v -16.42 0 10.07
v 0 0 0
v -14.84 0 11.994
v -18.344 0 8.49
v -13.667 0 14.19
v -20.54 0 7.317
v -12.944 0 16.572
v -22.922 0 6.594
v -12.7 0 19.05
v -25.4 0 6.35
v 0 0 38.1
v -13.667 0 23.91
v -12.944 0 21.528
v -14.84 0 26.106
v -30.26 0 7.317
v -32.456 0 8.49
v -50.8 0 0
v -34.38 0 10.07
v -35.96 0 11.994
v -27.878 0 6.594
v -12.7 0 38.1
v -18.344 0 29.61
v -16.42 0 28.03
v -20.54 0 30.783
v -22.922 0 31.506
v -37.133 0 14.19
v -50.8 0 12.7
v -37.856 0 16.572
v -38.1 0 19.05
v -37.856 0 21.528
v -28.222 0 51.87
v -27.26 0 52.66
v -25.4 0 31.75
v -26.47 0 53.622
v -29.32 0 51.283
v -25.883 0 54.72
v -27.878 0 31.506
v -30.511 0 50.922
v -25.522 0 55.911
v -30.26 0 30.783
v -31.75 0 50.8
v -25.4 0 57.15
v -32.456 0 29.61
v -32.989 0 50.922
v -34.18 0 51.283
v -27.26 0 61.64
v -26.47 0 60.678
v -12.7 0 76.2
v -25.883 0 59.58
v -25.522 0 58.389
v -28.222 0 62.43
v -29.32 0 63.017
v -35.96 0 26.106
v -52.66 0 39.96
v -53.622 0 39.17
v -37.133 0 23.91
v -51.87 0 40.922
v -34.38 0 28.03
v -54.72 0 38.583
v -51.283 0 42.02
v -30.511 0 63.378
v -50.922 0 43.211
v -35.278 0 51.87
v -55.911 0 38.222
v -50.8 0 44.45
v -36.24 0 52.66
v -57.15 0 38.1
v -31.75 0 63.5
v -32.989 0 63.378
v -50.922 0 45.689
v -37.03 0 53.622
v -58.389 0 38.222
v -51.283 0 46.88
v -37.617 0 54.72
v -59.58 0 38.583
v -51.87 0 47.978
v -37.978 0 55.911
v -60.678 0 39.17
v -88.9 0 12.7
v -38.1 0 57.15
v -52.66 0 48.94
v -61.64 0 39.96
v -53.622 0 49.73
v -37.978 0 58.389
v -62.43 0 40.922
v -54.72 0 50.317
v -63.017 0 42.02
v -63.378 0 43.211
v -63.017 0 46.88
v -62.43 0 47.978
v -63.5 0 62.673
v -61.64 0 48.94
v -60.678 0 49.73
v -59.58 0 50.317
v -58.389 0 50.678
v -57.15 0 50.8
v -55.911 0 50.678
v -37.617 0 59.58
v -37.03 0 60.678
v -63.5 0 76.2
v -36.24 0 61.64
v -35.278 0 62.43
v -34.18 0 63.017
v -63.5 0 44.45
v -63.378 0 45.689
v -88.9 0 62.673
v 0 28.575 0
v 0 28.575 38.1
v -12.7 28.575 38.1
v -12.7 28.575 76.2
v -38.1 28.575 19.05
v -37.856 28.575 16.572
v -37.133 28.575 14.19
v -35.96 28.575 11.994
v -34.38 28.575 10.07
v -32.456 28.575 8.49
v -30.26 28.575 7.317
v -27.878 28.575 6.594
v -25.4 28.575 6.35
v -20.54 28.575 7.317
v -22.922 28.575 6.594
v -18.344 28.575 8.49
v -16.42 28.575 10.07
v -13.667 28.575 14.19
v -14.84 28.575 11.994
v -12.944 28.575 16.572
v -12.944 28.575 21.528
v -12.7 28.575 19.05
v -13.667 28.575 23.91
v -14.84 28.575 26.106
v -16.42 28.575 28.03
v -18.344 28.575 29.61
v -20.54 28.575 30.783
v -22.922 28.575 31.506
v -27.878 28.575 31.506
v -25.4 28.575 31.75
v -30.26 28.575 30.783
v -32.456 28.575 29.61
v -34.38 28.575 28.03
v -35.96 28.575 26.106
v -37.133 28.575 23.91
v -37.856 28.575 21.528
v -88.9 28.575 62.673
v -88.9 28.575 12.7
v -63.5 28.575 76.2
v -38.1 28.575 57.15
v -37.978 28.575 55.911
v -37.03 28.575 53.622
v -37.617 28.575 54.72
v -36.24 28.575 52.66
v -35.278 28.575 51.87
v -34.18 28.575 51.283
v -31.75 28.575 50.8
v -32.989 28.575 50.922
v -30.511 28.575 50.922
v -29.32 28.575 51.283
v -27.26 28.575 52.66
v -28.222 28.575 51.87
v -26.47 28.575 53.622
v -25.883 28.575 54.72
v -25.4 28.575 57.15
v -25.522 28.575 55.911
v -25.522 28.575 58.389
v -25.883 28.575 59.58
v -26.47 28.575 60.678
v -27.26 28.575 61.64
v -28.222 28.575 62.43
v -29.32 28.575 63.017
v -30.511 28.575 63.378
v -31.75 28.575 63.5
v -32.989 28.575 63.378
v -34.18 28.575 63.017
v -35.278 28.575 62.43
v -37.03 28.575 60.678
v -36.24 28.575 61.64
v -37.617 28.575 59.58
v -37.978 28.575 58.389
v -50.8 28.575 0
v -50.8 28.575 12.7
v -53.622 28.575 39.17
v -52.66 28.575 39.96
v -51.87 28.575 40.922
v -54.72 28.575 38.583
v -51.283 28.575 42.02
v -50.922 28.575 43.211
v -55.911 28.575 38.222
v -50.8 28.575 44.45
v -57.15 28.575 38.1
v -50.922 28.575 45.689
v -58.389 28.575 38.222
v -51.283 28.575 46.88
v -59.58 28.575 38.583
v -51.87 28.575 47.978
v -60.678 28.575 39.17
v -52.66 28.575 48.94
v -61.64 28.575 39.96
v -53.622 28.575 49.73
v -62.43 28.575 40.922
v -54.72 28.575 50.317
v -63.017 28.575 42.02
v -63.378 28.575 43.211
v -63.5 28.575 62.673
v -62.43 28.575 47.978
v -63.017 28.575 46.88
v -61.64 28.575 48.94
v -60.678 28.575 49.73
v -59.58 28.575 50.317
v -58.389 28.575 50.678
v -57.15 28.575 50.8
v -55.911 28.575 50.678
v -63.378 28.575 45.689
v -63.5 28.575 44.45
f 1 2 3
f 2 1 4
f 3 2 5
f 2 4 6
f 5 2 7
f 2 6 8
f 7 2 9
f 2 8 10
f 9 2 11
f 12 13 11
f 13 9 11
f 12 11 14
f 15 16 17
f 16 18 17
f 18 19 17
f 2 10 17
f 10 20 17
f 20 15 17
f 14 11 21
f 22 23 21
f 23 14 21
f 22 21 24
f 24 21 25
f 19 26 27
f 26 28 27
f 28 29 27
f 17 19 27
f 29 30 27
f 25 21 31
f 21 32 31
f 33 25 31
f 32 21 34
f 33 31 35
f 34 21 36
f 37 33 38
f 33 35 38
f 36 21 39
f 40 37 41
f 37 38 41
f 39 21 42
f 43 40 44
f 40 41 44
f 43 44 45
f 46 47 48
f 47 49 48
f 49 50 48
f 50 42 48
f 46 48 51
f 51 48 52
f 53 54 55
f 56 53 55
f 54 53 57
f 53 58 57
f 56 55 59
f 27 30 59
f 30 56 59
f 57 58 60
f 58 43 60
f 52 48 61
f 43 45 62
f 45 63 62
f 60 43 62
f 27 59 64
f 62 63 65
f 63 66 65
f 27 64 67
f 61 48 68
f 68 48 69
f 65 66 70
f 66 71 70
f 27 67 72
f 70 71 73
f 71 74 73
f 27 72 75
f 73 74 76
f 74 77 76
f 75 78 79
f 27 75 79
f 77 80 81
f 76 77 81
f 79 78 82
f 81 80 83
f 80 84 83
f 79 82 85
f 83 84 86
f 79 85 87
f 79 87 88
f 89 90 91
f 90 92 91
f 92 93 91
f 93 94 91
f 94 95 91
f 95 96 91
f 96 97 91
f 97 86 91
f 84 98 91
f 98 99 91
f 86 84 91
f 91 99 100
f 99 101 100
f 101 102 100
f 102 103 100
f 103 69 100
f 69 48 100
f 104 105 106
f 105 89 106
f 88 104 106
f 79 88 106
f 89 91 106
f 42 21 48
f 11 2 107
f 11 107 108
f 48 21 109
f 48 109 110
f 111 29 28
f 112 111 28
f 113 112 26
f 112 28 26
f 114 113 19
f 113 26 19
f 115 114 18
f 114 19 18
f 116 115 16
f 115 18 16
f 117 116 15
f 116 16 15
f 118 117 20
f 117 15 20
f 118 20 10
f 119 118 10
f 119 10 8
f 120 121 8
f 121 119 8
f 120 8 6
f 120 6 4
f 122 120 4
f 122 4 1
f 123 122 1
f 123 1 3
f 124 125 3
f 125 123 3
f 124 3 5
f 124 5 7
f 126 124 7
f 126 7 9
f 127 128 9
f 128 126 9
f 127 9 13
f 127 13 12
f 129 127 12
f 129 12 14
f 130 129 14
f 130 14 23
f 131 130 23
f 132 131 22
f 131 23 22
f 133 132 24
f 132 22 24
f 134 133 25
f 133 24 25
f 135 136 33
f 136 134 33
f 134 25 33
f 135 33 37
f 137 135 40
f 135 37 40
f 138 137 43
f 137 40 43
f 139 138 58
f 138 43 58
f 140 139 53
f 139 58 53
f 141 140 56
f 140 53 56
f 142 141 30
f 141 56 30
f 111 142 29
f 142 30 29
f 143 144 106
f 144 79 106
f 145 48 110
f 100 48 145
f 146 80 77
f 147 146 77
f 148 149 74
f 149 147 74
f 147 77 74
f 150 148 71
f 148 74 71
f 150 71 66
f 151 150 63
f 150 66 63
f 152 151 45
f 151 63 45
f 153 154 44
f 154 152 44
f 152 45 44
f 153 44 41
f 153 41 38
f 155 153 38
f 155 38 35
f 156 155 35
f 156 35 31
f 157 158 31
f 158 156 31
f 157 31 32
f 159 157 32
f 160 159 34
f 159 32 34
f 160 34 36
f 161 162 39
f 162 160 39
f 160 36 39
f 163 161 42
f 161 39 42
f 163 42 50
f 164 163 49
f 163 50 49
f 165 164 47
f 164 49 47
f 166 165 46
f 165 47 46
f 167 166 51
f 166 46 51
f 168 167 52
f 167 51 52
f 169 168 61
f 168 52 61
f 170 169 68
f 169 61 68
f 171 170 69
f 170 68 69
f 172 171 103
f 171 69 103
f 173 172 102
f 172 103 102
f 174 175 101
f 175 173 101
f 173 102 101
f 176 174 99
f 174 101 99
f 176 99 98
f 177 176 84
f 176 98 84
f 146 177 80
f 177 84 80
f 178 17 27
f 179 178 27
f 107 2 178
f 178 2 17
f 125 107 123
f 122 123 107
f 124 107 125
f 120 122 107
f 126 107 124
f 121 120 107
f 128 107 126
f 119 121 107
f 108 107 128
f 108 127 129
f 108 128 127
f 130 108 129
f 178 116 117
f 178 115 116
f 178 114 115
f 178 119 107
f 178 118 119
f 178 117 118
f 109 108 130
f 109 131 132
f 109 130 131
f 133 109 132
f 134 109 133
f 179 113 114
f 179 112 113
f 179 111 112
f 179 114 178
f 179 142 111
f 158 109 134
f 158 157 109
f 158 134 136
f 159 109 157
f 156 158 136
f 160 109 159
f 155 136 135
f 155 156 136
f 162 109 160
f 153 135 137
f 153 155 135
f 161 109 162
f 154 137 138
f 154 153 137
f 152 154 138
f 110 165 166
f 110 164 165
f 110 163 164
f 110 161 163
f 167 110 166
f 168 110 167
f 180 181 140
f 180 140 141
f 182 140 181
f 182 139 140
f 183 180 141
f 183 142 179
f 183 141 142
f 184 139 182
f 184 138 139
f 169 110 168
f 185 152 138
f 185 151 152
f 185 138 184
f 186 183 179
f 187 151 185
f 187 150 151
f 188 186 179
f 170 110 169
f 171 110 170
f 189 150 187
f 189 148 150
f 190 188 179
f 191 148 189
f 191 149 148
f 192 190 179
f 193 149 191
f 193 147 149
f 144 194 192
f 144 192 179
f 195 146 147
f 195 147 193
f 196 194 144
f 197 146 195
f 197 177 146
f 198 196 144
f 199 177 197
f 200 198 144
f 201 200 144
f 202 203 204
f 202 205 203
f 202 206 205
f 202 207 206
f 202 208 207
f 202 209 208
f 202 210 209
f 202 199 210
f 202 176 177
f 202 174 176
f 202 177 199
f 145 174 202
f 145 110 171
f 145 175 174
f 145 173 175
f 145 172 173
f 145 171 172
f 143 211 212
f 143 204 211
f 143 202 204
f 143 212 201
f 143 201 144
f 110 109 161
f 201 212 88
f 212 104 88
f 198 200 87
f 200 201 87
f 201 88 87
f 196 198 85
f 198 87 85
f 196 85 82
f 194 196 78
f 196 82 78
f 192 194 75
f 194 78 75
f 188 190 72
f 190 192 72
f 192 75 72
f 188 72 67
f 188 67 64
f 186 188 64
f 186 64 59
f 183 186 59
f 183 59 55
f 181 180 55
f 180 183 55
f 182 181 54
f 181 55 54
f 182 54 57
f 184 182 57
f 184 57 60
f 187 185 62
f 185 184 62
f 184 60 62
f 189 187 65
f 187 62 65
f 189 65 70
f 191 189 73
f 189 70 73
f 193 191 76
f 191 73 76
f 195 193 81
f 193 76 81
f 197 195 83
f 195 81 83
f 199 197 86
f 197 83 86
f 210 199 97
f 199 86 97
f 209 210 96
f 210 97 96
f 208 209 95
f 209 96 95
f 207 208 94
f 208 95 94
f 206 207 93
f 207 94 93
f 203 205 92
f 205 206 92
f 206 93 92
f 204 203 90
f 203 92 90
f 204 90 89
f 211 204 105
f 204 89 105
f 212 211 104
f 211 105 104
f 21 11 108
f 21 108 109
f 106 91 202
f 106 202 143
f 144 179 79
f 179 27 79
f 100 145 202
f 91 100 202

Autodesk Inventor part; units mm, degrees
ref_plane "YZ Plane" through (0, 0, 0) normal (1, 0, 0) x (0, 1, 0)
ref_plane "XZ Plane" through (0, 0, 0) normal (0, 1, 0) x (-1, 0, 0)
ref_plane "XY Plane" through (0, 0, 0) normal (0, 0, 1) x (1, 0, 0)
sketch "Sketch1" plane through (0, 0, 0) normal (0, 1, 0) x (-1, 0, 0)
  line L0 (0, 0) -> (0, 38.1)
  line L1 (0, 38.1) -> (12.7, 38.1)
  line L2 (12.7, 38.1) -> (12.7, 76.2)
  line L3 (0, 0) -> (50.8, 0)
  line L4 (50.8, 0) -> (50.8, 12.7)
  line L5 (50.8, 12.7) -> (88.9, 12.7)
  line L6 (88.9, 12.7) -> (88.9, 62.673)
  circle A0 centre (25.4, 19.05) radius 12.7
  circle A1 centre (31.75, 57.15) radius 6.35
  line L7 (12.7, 76.2) -> (63.5, 76.2)
  line L8 (63.5, 76.2) -> (63.5, 62.673)
  line L9 (63.5, 62.673) -> (88.9, 62.673)
  circle A2 centre (57.15, 44.45) radius 6.35
  dimension "d0" = 38.1
  dimension "d1" = 50.8
  dimension "d2" = 25.4
  dimension "d3" = 12.7
  dimension "d4" = 12.7
extrude "Extrusion1" add sketch "Sketch1" along normal blind 28.575
properties part number "P1-4"
